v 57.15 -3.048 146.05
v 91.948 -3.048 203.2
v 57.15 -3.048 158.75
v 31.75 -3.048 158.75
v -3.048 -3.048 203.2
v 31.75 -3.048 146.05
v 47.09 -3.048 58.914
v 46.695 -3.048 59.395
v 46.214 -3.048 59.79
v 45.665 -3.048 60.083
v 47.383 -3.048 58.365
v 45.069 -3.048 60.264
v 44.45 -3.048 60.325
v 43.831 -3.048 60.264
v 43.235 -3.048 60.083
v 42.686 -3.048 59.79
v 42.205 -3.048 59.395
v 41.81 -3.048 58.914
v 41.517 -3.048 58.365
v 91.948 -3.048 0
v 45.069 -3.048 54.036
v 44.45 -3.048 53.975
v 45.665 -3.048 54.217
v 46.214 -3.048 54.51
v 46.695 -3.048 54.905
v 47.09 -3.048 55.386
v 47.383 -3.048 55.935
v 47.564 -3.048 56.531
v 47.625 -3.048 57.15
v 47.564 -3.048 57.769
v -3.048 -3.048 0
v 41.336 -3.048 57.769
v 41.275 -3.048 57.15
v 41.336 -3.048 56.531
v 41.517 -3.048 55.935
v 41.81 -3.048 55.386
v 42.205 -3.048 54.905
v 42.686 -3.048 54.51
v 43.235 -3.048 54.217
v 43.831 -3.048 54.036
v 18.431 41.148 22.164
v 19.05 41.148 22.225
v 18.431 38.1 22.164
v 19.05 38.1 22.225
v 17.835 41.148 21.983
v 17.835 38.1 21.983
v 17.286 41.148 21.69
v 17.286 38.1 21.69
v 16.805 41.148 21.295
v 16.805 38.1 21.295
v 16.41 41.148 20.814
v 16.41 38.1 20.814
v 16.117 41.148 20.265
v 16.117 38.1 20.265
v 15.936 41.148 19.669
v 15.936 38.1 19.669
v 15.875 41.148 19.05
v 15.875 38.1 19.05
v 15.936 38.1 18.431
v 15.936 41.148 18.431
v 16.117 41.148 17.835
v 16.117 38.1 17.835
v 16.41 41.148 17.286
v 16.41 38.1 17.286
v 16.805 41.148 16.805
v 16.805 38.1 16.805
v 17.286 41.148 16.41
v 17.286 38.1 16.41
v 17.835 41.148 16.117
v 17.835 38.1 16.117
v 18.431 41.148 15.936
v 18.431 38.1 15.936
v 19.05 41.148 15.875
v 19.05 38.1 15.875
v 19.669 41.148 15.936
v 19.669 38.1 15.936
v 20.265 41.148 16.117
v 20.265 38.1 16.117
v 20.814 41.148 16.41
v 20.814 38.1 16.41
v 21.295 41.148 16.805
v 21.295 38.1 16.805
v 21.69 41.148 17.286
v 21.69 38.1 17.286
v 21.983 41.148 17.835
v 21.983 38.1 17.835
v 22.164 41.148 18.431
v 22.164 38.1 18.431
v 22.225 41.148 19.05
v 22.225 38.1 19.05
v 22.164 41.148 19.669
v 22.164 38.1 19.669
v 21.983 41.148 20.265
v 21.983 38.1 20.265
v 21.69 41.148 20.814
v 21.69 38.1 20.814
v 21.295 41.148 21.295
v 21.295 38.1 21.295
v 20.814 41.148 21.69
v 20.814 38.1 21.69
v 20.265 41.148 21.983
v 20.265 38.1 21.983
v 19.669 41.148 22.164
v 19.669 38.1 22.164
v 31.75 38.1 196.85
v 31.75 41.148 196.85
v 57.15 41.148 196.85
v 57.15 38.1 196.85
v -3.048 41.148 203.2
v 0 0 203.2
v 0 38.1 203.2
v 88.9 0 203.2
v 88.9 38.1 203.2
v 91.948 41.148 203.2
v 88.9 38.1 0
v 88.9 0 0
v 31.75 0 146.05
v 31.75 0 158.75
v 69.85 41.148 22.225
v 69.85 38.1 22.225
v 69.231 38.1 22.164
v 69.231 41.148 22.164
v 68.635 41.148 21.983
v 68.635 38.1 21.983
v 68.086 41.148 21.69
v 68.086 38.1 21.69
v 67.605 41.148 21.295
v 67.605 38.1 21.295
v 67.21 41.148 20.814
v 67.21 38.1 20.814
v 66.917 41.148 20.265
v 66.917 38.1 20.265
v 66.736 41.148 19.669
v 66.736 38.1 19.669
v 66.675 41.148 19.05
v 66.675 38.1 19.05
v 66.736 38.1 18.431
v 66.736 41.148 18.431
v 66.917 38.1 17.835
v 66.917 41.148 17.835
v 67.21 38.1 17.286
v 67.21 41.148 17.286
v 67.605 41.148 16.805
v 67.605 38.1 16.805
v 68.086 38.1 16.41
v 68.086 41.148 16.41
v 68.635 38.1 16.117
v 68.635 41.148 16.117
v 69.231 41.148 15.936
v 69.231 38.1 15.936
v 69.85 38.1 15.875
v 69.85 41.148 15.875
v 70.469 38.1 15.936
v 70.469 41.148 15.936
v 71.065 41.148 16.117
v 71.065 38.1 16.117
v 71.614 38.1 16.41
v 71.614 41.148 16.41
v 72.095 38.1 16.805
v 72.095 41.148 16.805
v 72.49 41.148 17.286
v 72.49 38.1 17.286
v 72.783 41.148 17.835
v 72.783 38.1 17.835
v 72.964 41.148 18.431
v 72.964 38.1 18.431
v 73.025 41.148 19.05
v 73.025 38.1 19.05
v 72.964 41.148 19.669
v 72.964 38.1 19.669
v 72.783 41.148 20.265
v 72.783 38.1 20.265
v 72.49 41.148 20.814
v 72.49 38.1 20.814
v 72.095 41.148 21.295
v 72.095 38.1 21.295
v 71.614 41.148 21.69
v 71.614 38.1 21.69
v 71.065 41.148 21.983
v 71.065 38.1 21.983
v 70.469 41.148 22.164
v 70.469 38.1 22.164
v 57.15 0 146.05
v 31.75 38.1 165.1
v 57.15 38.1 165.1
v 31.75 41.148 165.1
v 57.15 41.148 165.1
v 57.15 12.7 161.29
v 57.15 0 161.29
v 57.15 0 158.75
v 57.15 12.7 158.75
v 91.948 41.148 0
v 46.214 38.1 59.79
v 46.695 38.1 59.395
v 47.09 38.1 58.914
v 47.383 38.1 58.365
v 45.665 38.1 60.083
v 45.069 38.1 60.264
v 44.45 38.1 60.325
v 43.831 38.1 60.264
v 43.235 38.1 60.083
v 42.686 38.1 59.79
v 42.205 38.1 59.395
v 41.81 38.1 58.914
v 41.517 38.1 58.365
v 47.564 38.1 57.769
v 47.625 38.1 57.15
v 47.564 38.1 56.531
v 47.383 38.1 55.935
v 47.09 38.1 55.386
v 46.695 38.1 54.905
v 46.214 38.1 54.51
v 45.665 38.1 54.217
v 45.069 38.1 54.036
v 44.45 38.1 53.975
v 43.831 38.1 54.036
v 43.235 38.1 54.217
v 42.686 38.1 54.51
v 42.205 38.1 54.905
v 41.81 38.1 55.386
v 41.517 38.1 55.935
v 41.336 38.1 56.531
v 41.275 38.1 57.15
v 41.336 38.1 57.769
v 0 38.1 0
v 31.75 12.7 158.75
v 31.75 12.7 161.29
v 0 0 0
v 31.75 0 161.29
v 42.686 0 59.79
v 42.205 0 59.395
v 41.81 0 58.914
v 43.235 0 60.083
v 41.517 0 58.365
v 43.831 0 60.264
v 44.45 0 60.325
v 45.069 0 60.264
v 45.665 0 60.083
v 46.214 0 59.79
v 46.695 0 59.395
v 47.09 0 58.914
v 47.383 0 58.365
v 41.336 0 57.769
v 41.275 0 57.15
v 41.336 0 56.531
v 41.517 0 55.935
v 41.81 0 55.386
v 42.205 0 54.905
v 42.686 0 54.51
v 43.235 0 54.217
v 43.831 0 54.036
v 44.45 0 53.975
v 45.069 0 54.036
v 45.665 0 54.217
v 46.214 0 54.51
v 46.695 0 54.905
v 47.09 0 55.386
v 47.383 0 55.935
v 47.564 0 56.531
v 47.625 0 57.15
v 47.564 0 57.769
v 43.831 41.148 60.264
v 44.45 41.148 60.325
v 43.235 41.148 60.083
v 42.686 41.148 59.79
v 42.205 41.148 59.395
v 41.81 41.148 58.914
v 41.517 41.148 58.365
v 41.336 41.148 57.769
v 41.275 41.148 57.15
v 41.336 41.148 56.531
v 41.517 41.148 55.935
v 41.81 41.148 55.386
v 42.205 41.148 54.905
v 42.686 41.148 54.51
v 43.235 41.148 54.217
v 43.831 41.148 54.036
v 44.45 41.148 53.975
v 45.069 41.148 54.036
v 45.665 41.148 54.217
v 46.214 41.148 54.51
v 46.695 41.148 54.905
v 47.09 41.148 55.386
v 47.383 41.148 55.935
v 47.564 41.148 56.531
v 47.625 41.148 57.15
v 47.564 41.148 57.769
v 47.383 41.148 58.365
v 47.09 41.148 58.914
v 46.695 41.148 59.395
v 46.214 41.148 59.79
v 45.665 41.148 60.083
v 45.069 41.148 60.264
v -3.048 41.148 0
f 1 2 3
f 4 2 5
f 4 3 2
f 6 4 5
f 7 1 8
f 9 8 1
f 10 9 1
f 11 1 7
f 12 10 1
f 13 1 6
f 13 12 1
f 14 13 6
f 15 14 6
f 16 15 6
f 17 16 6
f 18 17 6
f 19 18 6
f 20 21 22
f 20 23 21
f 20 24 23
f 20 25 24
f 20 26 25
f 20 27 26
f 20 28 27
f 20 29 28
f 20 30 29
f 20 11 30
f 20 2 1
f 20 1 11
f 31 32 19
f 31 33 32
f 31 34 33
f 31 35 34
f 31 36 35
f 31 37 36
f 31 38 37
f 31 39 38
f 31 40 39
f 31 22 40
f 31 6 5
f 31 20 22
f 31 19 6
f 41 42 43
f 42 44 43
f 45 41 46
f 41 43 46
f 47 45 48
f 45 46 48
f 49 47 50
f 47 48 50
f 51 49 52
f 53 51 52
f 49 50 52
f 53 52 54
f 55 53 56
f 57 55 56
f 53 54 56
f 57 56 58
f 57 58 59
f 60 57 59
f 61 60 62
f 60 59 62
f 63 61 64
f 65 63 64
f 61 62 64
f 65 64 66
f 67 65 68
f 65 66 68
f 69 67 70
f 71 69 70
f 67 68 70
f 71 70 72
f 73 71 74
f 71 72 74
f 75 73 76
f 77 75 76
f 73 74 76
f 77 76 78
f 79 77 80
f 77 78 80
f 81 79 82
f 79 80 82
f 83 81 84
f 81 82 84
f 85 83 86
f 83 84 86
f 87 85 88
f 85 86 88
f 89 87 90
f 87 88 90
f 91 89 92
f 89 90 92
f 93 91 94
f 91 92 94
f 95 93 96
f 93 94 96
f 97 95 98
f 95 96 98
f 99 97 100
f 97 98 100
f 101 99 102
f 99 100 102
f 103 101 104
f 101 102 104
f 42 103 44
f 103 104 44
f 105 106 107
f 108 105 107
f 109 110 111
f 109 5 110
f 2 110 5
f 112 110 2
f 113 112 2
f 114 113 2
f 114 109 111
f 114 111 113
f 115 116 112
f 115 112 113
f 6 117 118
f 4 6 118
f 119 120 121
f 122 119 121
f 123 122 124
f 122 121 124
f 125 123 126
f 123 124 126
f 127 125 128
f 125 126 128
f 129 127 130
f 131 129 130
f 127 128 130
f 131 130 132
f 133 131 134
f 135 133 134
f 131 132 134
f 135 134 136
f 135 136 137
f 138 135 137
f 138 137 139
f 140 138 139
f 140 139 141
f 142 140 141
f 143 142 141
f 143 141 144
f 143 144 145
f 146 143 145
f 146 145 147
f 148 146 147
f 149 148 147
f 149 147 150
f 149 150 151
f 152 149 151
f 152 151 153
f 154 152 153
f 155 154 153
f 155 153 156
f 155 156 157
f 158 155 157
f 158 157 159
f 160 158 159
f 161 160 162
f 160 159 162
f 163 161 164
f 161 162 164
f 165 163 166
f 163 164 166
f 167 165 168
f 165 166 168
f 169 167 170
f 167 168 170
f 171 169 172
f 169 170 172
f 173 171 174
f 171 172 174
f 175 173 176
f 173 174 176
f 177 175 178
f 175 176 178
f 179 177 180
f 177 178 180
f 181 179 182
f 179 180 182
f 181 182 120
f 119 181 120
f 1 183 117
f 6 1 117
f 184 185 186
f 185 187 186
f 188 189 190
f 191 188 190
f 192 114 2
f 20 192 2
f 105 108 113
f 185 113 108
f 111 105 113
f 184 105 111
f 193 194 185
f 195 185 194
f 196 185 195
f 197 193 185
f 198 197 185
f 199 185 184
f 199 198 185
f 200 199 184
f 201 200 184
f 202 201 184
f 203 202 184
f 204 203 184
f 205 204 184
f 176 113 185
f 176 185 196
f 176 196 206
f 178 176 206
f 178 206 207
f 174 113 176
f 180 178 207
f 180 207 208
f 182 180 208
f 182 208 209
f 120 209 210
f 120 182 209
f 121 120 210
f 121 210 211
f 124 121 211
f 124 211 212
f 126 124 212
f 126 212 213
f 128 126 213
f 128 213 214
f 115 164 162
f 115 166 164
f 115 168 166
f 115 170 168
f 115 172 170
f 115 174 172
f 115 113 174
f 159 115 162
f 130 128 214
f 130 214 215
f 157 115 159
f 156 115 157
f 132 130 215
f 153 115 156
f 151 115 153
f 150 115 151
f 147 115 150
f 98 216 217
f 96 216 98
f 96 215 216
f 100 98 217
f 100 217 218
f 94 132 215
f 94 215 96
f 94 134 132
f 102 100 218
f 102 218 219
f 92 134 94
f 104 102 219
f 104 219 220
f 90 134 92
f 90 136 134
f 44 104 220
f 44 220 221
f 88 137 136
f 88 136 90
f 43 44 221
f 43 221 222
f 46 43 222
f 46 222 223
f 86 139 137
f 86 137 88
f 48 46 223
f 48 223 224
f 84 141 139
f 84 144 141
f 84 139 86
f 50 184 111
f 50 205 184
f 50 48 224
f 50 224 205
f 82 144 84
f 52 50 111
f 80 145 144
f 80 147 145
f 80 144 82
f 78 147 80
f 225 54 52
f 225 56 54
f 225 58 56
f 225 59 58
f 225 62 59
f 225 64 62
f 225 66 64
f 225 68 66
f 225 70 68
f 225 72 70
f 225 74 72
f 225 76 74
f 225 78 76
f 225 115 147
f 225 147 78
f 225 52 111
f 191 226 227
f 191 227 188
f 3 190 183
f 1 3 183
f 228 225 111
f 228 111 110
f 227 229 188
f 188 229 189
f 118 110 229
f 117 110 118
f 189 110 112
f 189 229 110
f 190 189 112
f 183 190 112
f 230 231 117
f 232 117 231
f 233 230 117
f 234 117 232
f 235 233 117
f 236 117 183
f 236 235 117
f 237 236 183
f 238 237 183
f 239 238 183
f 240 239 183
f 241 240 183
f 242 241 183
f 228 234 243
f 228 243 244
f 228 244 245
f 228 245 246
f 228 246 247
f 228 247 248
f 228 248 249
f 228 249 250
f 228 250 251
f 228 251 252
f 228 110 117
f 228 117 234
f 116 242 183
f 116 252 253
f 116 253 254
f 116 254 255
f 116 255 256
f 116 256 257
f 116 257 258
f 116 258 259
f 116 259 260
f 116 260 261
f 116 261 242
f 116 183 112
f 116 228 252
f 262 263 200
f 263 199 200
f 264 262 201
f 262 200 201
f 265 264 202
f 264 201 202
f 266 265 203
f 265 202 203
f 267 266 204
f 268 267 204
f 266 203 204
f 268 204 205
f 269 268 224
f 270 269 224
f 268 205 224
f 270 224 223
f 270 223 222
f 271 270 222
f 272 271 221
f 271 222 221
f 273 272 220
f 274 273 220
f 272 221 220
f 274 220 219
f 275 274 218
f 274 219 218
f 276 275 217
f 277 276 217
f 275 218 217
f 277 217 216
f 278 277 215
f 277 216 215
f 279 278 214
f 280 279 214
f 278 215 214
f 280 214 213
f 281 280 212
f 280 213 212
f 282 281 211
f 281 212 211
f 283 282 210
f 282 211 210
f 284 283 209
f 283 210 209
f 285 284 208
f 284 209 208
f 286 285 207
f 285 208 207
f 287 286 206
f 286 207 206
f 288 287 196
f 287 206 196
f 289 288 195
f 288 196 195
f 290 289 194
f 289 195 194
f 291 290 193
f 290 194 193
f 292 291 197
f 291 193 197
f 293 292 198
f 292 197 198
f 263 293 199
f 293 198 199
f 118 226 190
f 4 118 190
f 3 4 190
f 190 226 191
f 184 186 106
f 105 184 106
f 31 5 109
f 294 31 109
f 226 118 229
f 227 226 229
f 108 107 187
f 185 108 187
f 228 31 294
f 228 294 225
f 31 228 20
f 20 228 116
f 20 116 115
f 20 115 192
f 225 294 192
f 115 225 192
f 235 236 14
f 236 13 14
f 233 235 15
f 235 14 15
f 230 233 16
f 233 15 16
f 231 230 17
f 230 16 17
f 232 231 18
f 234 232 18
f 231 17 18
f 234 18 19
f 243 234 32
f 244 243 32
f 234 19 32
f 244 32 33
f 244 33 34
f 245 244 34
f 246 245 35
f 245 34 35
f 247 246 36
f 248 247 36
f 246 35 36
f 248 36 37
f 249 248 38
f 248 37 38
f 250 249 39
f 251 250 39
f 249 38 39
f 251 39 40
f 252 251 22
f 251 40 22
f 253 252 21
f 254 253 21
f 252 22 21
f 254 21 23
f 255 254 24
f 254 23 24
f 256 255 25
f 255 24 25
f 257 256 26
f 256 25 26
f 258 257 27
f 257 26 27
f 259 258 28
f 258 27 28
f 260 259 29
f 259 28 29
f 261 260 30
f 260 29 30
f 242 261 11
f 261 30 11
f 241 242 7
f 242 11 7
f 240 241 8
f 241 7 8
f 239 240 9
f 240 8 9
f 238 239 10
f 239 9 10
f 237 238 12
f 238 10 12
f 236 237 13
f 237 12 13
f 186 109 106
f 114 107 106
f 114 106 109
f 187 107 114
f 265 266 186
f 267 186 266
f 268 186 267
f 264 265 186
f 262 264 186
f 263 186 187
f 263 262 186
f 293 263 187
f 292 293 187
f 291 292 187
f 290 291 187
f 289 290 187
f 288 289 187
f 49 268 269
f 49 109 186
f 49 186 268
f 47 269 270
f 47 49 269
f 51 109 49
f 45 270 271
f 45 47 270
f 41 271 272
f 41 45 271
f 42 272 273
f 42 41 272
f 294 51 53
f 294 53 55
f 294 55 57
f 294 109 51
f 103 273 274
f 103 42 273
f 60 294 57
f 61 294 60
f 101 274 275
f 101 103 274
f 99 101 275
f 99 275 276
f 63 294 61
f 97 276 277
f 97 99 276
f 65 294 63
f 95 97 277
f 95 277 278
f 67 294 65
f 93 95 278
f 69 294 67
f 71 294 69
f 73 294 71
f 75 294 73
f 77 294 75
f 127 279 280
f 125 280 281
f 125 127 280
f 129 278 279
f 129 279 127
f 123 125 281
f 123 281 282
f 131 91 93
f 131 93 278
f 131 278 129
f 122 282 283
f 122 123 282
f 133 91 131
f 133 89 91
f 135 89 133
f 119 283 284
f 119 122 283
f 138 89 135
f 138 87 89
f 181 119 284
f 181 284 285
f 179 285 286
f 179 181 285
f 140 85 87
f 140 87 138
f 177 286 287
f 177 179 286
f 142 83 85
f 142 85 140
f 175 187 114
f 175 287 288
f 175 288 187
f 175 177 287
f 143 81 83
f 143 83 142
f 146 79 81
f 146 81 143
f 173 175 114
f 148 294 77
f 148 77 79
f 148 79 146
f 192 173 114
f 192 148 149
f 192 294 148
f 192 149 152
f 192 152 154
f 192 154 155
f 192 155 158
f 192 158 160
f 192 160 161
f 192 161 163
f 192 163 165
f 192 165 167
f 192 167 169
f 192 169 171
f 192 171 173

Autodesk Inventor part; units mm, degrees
ref_plane "YZ Plane" through (0, 0, 0) normal (1, 0, 0) x (0, 1, 0)
ref_plane "XZ Plane" through (0, 0, 0) normal (0, 1, 0) x (-1, 0, 0)
ref_plane "XY Plane" through (0, 0, 0) normal (0, 0, 1) x (1, 0, 0)
sketch "Sketch1" plane through (0, 0, 0) normal (0, 0, 1) x (1, 0, 0)
  line L0 (0, 0) -> (88.9, 0)
  line L1 (88.9, 0) -> (88.9, 38.1)
  line L2 (88.9, 38.1) -> (0, 38.1)
  line L3 (0, 38.1) -> (0, 0)
  line L4 (-3.048, 41.148) -> (91.948, 41.148)
  line L5 (91.948, 41.148) -> (91.948, -3.048)
  line L6 (91.948, -3.048) -> (-3.048, -3.048)
  line L7 (-3.048, -3.048) -> (-3.048, 41.148)
  dimension "d0" = 88.9
  dimension "d1" = 38.1
  dimension "d2" = 3.048
extrude "Extrusion1" add sketch "Sketch1" along normal blind 203.2
sketch "Sketch3" plane through (-3.048, 41.148, 0) normal (0, 1, 0) x (1, 0, 0)
  line L0 (0, 0) -> (0, -203.2) projected
  line L1 (94.996, -203.2) -> (0, -203.2) projected
  line L2 (15.24, -203.2) -> (17.78, -203.2)
  line L3 (17.78, -203.2) -> (17.78, -177.8)
  line L4 (17.78, -177.8) -> (15.24, -177.8)
  line L5 (15.24, -177.8) -> (15.24, -203.2)
  line L6 (47.498, -203.2) -> (47.498, -149.4712) construction
  line L7 (79.756, -203.2) -> (77.216, -203.2)
  line L8 (77.216, -203.2) -> (77.216, -177.8)
  line L9 (77.216, -177.8) -> (79.756, -177.8)
  line L10 (79.756, -177.8) -> (79.756, -203.2)
  point P0 (3.048, 0)
  dimension "d10" = 2.54
  dimension "d11" = 25.4
  dimension "d12" = 15.24
extrude "Extrusion3" [suppressed]
sketch "Sketch4" plane through (-3.048, 41.148, 0) normal (0, 1, 0) x (1, 0, 0)
  line L0 (94.996, -203.2) -> (0, -203.2) projected
  line L1 (94.996, -203.2) -> (0, -203.2) projected
  line L2 (15.24, -177.8) -> (2.54, -177.8)
  line L3 (2.54, -177.8) -> (2.54, -203.2)
  line L4 (2.54, -203.2) -> (15.24, -203.2)
  line L5 (15.24, -203.2) -> (15.24, -177.8)
  line L6 (47.498, -203.2) -> (47.498, -154.3799) construction
  line L7 (79.756, -203.2) -> (79.756, -177.8)
  line L8 (79.756, -177.8) -> (92.456, -177.8)
  line L9 (92.456, -177.8) -> (92.456, -203.2)
  line L10 (92.456, -203.2) -> (79.756, -203.2)
  line L11 (79.756, -203.2) -> (79.756, -177.8)
  point P0 (17.78, -203.2)
  point P1 (77.216, -203.2)
  point P2 (15.24, -203.2)
  point P3 (3.048, 0)
  dimension "d15" = 12.7
extrude "Extrusion4" [suppressed]
sketch "Sketch5" plane through (0, 0, 0) normal (0, 1, 0) x (1, 0, 0)
  line L0 (0, 0) -> (0, -203.2) projected
  line L1 (88.9, -203.2) -> (0, -203.2) projected
  line L2 (31.75, -161.29) -> (57.15, -161.29)
  line L3 (57.15, -161.29) -> (57.15, -158.75)
  line L4 (57.15, -158.75) -> (31.75, -158.75)
  line L5 (31.75, -158.75) -> (31.75, -161.29)
  dimension "d18" = 25.4
  dimension "d19" = 31.75
  dimension "d20" = 44.45
  dimension "d21" = 2.54
extrude "Extrusion5" add sketch "Sketch5" along normal blind 12.7
sketch "Sketch6" plane through (0, 0, 0) normal (0, 1, 0) x (1, 0, 0)
  line L0 (31.75, -158.75) -> (57.15, -158.75)
  line L1 (57.15, -158.75) -> (57.15, -146.05)
  line L2 (57.15, -146.05) -> (31.75, -146.05)
  line L3 (31.75, -146.05) -> (31.75, -158.75)
  dimension "d24" = 25.4
  dimension "d25" = 12.7
extrude "Extrusion6" cut sketch "Sketch6" against normal blind 12.7
sketch "Sketch7" plane through (12.192, 38.1, 203.2) normal (-1, 0, 0) x (0, 0, 1)
  line L0 (-25.4, 15.748) -> (0, 15.748) projected
  circle A0 centre (-12.7, 10.668) radius 0.6717
  point P0 (-203.2, -38.1)
  dimension "d28" = 5.08
hole "Hole1" [suppressed]
sketch "Sketch11" plane through (-3.048, 41.148, 0) normal (0, 1, 0) x (1, 0, 0)
  line L0 (0, 0) -> (94.996, 0) projected
  line L1 (94.996, -203.2) -> (0, -203.2) projected
  line L2 (47.498, 0) -> (47.498, -203.2) construction
  line L3 (34.798, -196.85) -> (60.198, -196.85)
  line L4 (60.198, -196.85) -> (60.198, -165.1)
  line L5 (60.198, -165.1) -> (34.798, -165.1)
  line L6 (34.798, -165.1) -> (34.798, -196.85)
  point P0 (3.048, 0)
  dimension "d60" = 6.35
  dimension "d61" = 31.75
  dimension "d62" = 25.4
extrude "Extrusion8" cut sketch "Sketch11" against normal blind 12.7
sketch "Sketch12" plane through (-3.048, 41.148, 0) normal (0, 1, 0) x (1, 0, 0)
  line L0 (0, 0) -> (94.996, 0) projected
  line L1 (0, 0) -> (0, -203.2) projected
  circle A0 centre (22.098, -19.05) radius 3.175
  circle A1 centre (72.898, -19.05) radius 3.175
  point P0 (3.048, 0)
  dimension "d65" = 6.35
  dimension "d66" = 19.05
  dimension "d67" = 22.098
  dimension "d68" = 6.35
  dimension "d70" = 50.8
hole "Hole3" at (19.05, 41.148, 19.05) at (69.85, 41.148, 19.05) direction (0, -1, 0) diameter 6.35 depth 25.4 tip angle 118
sketch "Sketch13" plane through (-3.048, 41.148, 0) normal (0, 1, 0) x (1, 0, 0)
  circle A0 centre (22.098, -19.05) radius 3.175 projected
  circle A1 centre (72.898, -19.05) radius 3.175 projected
  line L0 (94.996, 0) -> (94.996, -203.2) projected
  line L1 (22.098, -19.05) -> (72.898, -19.05) construction
  circle A2 centre (47.498, -57.15) radius 3.5871
  point P0 (3.048, 0)
  dimension "d80" = 38.1
hole "Hole4" at (44.45, 41.148, 57.15) direction (0, -1, 0) diameter 6.35 end through all
properties part number "2p1h37" material "Steel, Galvanized"
